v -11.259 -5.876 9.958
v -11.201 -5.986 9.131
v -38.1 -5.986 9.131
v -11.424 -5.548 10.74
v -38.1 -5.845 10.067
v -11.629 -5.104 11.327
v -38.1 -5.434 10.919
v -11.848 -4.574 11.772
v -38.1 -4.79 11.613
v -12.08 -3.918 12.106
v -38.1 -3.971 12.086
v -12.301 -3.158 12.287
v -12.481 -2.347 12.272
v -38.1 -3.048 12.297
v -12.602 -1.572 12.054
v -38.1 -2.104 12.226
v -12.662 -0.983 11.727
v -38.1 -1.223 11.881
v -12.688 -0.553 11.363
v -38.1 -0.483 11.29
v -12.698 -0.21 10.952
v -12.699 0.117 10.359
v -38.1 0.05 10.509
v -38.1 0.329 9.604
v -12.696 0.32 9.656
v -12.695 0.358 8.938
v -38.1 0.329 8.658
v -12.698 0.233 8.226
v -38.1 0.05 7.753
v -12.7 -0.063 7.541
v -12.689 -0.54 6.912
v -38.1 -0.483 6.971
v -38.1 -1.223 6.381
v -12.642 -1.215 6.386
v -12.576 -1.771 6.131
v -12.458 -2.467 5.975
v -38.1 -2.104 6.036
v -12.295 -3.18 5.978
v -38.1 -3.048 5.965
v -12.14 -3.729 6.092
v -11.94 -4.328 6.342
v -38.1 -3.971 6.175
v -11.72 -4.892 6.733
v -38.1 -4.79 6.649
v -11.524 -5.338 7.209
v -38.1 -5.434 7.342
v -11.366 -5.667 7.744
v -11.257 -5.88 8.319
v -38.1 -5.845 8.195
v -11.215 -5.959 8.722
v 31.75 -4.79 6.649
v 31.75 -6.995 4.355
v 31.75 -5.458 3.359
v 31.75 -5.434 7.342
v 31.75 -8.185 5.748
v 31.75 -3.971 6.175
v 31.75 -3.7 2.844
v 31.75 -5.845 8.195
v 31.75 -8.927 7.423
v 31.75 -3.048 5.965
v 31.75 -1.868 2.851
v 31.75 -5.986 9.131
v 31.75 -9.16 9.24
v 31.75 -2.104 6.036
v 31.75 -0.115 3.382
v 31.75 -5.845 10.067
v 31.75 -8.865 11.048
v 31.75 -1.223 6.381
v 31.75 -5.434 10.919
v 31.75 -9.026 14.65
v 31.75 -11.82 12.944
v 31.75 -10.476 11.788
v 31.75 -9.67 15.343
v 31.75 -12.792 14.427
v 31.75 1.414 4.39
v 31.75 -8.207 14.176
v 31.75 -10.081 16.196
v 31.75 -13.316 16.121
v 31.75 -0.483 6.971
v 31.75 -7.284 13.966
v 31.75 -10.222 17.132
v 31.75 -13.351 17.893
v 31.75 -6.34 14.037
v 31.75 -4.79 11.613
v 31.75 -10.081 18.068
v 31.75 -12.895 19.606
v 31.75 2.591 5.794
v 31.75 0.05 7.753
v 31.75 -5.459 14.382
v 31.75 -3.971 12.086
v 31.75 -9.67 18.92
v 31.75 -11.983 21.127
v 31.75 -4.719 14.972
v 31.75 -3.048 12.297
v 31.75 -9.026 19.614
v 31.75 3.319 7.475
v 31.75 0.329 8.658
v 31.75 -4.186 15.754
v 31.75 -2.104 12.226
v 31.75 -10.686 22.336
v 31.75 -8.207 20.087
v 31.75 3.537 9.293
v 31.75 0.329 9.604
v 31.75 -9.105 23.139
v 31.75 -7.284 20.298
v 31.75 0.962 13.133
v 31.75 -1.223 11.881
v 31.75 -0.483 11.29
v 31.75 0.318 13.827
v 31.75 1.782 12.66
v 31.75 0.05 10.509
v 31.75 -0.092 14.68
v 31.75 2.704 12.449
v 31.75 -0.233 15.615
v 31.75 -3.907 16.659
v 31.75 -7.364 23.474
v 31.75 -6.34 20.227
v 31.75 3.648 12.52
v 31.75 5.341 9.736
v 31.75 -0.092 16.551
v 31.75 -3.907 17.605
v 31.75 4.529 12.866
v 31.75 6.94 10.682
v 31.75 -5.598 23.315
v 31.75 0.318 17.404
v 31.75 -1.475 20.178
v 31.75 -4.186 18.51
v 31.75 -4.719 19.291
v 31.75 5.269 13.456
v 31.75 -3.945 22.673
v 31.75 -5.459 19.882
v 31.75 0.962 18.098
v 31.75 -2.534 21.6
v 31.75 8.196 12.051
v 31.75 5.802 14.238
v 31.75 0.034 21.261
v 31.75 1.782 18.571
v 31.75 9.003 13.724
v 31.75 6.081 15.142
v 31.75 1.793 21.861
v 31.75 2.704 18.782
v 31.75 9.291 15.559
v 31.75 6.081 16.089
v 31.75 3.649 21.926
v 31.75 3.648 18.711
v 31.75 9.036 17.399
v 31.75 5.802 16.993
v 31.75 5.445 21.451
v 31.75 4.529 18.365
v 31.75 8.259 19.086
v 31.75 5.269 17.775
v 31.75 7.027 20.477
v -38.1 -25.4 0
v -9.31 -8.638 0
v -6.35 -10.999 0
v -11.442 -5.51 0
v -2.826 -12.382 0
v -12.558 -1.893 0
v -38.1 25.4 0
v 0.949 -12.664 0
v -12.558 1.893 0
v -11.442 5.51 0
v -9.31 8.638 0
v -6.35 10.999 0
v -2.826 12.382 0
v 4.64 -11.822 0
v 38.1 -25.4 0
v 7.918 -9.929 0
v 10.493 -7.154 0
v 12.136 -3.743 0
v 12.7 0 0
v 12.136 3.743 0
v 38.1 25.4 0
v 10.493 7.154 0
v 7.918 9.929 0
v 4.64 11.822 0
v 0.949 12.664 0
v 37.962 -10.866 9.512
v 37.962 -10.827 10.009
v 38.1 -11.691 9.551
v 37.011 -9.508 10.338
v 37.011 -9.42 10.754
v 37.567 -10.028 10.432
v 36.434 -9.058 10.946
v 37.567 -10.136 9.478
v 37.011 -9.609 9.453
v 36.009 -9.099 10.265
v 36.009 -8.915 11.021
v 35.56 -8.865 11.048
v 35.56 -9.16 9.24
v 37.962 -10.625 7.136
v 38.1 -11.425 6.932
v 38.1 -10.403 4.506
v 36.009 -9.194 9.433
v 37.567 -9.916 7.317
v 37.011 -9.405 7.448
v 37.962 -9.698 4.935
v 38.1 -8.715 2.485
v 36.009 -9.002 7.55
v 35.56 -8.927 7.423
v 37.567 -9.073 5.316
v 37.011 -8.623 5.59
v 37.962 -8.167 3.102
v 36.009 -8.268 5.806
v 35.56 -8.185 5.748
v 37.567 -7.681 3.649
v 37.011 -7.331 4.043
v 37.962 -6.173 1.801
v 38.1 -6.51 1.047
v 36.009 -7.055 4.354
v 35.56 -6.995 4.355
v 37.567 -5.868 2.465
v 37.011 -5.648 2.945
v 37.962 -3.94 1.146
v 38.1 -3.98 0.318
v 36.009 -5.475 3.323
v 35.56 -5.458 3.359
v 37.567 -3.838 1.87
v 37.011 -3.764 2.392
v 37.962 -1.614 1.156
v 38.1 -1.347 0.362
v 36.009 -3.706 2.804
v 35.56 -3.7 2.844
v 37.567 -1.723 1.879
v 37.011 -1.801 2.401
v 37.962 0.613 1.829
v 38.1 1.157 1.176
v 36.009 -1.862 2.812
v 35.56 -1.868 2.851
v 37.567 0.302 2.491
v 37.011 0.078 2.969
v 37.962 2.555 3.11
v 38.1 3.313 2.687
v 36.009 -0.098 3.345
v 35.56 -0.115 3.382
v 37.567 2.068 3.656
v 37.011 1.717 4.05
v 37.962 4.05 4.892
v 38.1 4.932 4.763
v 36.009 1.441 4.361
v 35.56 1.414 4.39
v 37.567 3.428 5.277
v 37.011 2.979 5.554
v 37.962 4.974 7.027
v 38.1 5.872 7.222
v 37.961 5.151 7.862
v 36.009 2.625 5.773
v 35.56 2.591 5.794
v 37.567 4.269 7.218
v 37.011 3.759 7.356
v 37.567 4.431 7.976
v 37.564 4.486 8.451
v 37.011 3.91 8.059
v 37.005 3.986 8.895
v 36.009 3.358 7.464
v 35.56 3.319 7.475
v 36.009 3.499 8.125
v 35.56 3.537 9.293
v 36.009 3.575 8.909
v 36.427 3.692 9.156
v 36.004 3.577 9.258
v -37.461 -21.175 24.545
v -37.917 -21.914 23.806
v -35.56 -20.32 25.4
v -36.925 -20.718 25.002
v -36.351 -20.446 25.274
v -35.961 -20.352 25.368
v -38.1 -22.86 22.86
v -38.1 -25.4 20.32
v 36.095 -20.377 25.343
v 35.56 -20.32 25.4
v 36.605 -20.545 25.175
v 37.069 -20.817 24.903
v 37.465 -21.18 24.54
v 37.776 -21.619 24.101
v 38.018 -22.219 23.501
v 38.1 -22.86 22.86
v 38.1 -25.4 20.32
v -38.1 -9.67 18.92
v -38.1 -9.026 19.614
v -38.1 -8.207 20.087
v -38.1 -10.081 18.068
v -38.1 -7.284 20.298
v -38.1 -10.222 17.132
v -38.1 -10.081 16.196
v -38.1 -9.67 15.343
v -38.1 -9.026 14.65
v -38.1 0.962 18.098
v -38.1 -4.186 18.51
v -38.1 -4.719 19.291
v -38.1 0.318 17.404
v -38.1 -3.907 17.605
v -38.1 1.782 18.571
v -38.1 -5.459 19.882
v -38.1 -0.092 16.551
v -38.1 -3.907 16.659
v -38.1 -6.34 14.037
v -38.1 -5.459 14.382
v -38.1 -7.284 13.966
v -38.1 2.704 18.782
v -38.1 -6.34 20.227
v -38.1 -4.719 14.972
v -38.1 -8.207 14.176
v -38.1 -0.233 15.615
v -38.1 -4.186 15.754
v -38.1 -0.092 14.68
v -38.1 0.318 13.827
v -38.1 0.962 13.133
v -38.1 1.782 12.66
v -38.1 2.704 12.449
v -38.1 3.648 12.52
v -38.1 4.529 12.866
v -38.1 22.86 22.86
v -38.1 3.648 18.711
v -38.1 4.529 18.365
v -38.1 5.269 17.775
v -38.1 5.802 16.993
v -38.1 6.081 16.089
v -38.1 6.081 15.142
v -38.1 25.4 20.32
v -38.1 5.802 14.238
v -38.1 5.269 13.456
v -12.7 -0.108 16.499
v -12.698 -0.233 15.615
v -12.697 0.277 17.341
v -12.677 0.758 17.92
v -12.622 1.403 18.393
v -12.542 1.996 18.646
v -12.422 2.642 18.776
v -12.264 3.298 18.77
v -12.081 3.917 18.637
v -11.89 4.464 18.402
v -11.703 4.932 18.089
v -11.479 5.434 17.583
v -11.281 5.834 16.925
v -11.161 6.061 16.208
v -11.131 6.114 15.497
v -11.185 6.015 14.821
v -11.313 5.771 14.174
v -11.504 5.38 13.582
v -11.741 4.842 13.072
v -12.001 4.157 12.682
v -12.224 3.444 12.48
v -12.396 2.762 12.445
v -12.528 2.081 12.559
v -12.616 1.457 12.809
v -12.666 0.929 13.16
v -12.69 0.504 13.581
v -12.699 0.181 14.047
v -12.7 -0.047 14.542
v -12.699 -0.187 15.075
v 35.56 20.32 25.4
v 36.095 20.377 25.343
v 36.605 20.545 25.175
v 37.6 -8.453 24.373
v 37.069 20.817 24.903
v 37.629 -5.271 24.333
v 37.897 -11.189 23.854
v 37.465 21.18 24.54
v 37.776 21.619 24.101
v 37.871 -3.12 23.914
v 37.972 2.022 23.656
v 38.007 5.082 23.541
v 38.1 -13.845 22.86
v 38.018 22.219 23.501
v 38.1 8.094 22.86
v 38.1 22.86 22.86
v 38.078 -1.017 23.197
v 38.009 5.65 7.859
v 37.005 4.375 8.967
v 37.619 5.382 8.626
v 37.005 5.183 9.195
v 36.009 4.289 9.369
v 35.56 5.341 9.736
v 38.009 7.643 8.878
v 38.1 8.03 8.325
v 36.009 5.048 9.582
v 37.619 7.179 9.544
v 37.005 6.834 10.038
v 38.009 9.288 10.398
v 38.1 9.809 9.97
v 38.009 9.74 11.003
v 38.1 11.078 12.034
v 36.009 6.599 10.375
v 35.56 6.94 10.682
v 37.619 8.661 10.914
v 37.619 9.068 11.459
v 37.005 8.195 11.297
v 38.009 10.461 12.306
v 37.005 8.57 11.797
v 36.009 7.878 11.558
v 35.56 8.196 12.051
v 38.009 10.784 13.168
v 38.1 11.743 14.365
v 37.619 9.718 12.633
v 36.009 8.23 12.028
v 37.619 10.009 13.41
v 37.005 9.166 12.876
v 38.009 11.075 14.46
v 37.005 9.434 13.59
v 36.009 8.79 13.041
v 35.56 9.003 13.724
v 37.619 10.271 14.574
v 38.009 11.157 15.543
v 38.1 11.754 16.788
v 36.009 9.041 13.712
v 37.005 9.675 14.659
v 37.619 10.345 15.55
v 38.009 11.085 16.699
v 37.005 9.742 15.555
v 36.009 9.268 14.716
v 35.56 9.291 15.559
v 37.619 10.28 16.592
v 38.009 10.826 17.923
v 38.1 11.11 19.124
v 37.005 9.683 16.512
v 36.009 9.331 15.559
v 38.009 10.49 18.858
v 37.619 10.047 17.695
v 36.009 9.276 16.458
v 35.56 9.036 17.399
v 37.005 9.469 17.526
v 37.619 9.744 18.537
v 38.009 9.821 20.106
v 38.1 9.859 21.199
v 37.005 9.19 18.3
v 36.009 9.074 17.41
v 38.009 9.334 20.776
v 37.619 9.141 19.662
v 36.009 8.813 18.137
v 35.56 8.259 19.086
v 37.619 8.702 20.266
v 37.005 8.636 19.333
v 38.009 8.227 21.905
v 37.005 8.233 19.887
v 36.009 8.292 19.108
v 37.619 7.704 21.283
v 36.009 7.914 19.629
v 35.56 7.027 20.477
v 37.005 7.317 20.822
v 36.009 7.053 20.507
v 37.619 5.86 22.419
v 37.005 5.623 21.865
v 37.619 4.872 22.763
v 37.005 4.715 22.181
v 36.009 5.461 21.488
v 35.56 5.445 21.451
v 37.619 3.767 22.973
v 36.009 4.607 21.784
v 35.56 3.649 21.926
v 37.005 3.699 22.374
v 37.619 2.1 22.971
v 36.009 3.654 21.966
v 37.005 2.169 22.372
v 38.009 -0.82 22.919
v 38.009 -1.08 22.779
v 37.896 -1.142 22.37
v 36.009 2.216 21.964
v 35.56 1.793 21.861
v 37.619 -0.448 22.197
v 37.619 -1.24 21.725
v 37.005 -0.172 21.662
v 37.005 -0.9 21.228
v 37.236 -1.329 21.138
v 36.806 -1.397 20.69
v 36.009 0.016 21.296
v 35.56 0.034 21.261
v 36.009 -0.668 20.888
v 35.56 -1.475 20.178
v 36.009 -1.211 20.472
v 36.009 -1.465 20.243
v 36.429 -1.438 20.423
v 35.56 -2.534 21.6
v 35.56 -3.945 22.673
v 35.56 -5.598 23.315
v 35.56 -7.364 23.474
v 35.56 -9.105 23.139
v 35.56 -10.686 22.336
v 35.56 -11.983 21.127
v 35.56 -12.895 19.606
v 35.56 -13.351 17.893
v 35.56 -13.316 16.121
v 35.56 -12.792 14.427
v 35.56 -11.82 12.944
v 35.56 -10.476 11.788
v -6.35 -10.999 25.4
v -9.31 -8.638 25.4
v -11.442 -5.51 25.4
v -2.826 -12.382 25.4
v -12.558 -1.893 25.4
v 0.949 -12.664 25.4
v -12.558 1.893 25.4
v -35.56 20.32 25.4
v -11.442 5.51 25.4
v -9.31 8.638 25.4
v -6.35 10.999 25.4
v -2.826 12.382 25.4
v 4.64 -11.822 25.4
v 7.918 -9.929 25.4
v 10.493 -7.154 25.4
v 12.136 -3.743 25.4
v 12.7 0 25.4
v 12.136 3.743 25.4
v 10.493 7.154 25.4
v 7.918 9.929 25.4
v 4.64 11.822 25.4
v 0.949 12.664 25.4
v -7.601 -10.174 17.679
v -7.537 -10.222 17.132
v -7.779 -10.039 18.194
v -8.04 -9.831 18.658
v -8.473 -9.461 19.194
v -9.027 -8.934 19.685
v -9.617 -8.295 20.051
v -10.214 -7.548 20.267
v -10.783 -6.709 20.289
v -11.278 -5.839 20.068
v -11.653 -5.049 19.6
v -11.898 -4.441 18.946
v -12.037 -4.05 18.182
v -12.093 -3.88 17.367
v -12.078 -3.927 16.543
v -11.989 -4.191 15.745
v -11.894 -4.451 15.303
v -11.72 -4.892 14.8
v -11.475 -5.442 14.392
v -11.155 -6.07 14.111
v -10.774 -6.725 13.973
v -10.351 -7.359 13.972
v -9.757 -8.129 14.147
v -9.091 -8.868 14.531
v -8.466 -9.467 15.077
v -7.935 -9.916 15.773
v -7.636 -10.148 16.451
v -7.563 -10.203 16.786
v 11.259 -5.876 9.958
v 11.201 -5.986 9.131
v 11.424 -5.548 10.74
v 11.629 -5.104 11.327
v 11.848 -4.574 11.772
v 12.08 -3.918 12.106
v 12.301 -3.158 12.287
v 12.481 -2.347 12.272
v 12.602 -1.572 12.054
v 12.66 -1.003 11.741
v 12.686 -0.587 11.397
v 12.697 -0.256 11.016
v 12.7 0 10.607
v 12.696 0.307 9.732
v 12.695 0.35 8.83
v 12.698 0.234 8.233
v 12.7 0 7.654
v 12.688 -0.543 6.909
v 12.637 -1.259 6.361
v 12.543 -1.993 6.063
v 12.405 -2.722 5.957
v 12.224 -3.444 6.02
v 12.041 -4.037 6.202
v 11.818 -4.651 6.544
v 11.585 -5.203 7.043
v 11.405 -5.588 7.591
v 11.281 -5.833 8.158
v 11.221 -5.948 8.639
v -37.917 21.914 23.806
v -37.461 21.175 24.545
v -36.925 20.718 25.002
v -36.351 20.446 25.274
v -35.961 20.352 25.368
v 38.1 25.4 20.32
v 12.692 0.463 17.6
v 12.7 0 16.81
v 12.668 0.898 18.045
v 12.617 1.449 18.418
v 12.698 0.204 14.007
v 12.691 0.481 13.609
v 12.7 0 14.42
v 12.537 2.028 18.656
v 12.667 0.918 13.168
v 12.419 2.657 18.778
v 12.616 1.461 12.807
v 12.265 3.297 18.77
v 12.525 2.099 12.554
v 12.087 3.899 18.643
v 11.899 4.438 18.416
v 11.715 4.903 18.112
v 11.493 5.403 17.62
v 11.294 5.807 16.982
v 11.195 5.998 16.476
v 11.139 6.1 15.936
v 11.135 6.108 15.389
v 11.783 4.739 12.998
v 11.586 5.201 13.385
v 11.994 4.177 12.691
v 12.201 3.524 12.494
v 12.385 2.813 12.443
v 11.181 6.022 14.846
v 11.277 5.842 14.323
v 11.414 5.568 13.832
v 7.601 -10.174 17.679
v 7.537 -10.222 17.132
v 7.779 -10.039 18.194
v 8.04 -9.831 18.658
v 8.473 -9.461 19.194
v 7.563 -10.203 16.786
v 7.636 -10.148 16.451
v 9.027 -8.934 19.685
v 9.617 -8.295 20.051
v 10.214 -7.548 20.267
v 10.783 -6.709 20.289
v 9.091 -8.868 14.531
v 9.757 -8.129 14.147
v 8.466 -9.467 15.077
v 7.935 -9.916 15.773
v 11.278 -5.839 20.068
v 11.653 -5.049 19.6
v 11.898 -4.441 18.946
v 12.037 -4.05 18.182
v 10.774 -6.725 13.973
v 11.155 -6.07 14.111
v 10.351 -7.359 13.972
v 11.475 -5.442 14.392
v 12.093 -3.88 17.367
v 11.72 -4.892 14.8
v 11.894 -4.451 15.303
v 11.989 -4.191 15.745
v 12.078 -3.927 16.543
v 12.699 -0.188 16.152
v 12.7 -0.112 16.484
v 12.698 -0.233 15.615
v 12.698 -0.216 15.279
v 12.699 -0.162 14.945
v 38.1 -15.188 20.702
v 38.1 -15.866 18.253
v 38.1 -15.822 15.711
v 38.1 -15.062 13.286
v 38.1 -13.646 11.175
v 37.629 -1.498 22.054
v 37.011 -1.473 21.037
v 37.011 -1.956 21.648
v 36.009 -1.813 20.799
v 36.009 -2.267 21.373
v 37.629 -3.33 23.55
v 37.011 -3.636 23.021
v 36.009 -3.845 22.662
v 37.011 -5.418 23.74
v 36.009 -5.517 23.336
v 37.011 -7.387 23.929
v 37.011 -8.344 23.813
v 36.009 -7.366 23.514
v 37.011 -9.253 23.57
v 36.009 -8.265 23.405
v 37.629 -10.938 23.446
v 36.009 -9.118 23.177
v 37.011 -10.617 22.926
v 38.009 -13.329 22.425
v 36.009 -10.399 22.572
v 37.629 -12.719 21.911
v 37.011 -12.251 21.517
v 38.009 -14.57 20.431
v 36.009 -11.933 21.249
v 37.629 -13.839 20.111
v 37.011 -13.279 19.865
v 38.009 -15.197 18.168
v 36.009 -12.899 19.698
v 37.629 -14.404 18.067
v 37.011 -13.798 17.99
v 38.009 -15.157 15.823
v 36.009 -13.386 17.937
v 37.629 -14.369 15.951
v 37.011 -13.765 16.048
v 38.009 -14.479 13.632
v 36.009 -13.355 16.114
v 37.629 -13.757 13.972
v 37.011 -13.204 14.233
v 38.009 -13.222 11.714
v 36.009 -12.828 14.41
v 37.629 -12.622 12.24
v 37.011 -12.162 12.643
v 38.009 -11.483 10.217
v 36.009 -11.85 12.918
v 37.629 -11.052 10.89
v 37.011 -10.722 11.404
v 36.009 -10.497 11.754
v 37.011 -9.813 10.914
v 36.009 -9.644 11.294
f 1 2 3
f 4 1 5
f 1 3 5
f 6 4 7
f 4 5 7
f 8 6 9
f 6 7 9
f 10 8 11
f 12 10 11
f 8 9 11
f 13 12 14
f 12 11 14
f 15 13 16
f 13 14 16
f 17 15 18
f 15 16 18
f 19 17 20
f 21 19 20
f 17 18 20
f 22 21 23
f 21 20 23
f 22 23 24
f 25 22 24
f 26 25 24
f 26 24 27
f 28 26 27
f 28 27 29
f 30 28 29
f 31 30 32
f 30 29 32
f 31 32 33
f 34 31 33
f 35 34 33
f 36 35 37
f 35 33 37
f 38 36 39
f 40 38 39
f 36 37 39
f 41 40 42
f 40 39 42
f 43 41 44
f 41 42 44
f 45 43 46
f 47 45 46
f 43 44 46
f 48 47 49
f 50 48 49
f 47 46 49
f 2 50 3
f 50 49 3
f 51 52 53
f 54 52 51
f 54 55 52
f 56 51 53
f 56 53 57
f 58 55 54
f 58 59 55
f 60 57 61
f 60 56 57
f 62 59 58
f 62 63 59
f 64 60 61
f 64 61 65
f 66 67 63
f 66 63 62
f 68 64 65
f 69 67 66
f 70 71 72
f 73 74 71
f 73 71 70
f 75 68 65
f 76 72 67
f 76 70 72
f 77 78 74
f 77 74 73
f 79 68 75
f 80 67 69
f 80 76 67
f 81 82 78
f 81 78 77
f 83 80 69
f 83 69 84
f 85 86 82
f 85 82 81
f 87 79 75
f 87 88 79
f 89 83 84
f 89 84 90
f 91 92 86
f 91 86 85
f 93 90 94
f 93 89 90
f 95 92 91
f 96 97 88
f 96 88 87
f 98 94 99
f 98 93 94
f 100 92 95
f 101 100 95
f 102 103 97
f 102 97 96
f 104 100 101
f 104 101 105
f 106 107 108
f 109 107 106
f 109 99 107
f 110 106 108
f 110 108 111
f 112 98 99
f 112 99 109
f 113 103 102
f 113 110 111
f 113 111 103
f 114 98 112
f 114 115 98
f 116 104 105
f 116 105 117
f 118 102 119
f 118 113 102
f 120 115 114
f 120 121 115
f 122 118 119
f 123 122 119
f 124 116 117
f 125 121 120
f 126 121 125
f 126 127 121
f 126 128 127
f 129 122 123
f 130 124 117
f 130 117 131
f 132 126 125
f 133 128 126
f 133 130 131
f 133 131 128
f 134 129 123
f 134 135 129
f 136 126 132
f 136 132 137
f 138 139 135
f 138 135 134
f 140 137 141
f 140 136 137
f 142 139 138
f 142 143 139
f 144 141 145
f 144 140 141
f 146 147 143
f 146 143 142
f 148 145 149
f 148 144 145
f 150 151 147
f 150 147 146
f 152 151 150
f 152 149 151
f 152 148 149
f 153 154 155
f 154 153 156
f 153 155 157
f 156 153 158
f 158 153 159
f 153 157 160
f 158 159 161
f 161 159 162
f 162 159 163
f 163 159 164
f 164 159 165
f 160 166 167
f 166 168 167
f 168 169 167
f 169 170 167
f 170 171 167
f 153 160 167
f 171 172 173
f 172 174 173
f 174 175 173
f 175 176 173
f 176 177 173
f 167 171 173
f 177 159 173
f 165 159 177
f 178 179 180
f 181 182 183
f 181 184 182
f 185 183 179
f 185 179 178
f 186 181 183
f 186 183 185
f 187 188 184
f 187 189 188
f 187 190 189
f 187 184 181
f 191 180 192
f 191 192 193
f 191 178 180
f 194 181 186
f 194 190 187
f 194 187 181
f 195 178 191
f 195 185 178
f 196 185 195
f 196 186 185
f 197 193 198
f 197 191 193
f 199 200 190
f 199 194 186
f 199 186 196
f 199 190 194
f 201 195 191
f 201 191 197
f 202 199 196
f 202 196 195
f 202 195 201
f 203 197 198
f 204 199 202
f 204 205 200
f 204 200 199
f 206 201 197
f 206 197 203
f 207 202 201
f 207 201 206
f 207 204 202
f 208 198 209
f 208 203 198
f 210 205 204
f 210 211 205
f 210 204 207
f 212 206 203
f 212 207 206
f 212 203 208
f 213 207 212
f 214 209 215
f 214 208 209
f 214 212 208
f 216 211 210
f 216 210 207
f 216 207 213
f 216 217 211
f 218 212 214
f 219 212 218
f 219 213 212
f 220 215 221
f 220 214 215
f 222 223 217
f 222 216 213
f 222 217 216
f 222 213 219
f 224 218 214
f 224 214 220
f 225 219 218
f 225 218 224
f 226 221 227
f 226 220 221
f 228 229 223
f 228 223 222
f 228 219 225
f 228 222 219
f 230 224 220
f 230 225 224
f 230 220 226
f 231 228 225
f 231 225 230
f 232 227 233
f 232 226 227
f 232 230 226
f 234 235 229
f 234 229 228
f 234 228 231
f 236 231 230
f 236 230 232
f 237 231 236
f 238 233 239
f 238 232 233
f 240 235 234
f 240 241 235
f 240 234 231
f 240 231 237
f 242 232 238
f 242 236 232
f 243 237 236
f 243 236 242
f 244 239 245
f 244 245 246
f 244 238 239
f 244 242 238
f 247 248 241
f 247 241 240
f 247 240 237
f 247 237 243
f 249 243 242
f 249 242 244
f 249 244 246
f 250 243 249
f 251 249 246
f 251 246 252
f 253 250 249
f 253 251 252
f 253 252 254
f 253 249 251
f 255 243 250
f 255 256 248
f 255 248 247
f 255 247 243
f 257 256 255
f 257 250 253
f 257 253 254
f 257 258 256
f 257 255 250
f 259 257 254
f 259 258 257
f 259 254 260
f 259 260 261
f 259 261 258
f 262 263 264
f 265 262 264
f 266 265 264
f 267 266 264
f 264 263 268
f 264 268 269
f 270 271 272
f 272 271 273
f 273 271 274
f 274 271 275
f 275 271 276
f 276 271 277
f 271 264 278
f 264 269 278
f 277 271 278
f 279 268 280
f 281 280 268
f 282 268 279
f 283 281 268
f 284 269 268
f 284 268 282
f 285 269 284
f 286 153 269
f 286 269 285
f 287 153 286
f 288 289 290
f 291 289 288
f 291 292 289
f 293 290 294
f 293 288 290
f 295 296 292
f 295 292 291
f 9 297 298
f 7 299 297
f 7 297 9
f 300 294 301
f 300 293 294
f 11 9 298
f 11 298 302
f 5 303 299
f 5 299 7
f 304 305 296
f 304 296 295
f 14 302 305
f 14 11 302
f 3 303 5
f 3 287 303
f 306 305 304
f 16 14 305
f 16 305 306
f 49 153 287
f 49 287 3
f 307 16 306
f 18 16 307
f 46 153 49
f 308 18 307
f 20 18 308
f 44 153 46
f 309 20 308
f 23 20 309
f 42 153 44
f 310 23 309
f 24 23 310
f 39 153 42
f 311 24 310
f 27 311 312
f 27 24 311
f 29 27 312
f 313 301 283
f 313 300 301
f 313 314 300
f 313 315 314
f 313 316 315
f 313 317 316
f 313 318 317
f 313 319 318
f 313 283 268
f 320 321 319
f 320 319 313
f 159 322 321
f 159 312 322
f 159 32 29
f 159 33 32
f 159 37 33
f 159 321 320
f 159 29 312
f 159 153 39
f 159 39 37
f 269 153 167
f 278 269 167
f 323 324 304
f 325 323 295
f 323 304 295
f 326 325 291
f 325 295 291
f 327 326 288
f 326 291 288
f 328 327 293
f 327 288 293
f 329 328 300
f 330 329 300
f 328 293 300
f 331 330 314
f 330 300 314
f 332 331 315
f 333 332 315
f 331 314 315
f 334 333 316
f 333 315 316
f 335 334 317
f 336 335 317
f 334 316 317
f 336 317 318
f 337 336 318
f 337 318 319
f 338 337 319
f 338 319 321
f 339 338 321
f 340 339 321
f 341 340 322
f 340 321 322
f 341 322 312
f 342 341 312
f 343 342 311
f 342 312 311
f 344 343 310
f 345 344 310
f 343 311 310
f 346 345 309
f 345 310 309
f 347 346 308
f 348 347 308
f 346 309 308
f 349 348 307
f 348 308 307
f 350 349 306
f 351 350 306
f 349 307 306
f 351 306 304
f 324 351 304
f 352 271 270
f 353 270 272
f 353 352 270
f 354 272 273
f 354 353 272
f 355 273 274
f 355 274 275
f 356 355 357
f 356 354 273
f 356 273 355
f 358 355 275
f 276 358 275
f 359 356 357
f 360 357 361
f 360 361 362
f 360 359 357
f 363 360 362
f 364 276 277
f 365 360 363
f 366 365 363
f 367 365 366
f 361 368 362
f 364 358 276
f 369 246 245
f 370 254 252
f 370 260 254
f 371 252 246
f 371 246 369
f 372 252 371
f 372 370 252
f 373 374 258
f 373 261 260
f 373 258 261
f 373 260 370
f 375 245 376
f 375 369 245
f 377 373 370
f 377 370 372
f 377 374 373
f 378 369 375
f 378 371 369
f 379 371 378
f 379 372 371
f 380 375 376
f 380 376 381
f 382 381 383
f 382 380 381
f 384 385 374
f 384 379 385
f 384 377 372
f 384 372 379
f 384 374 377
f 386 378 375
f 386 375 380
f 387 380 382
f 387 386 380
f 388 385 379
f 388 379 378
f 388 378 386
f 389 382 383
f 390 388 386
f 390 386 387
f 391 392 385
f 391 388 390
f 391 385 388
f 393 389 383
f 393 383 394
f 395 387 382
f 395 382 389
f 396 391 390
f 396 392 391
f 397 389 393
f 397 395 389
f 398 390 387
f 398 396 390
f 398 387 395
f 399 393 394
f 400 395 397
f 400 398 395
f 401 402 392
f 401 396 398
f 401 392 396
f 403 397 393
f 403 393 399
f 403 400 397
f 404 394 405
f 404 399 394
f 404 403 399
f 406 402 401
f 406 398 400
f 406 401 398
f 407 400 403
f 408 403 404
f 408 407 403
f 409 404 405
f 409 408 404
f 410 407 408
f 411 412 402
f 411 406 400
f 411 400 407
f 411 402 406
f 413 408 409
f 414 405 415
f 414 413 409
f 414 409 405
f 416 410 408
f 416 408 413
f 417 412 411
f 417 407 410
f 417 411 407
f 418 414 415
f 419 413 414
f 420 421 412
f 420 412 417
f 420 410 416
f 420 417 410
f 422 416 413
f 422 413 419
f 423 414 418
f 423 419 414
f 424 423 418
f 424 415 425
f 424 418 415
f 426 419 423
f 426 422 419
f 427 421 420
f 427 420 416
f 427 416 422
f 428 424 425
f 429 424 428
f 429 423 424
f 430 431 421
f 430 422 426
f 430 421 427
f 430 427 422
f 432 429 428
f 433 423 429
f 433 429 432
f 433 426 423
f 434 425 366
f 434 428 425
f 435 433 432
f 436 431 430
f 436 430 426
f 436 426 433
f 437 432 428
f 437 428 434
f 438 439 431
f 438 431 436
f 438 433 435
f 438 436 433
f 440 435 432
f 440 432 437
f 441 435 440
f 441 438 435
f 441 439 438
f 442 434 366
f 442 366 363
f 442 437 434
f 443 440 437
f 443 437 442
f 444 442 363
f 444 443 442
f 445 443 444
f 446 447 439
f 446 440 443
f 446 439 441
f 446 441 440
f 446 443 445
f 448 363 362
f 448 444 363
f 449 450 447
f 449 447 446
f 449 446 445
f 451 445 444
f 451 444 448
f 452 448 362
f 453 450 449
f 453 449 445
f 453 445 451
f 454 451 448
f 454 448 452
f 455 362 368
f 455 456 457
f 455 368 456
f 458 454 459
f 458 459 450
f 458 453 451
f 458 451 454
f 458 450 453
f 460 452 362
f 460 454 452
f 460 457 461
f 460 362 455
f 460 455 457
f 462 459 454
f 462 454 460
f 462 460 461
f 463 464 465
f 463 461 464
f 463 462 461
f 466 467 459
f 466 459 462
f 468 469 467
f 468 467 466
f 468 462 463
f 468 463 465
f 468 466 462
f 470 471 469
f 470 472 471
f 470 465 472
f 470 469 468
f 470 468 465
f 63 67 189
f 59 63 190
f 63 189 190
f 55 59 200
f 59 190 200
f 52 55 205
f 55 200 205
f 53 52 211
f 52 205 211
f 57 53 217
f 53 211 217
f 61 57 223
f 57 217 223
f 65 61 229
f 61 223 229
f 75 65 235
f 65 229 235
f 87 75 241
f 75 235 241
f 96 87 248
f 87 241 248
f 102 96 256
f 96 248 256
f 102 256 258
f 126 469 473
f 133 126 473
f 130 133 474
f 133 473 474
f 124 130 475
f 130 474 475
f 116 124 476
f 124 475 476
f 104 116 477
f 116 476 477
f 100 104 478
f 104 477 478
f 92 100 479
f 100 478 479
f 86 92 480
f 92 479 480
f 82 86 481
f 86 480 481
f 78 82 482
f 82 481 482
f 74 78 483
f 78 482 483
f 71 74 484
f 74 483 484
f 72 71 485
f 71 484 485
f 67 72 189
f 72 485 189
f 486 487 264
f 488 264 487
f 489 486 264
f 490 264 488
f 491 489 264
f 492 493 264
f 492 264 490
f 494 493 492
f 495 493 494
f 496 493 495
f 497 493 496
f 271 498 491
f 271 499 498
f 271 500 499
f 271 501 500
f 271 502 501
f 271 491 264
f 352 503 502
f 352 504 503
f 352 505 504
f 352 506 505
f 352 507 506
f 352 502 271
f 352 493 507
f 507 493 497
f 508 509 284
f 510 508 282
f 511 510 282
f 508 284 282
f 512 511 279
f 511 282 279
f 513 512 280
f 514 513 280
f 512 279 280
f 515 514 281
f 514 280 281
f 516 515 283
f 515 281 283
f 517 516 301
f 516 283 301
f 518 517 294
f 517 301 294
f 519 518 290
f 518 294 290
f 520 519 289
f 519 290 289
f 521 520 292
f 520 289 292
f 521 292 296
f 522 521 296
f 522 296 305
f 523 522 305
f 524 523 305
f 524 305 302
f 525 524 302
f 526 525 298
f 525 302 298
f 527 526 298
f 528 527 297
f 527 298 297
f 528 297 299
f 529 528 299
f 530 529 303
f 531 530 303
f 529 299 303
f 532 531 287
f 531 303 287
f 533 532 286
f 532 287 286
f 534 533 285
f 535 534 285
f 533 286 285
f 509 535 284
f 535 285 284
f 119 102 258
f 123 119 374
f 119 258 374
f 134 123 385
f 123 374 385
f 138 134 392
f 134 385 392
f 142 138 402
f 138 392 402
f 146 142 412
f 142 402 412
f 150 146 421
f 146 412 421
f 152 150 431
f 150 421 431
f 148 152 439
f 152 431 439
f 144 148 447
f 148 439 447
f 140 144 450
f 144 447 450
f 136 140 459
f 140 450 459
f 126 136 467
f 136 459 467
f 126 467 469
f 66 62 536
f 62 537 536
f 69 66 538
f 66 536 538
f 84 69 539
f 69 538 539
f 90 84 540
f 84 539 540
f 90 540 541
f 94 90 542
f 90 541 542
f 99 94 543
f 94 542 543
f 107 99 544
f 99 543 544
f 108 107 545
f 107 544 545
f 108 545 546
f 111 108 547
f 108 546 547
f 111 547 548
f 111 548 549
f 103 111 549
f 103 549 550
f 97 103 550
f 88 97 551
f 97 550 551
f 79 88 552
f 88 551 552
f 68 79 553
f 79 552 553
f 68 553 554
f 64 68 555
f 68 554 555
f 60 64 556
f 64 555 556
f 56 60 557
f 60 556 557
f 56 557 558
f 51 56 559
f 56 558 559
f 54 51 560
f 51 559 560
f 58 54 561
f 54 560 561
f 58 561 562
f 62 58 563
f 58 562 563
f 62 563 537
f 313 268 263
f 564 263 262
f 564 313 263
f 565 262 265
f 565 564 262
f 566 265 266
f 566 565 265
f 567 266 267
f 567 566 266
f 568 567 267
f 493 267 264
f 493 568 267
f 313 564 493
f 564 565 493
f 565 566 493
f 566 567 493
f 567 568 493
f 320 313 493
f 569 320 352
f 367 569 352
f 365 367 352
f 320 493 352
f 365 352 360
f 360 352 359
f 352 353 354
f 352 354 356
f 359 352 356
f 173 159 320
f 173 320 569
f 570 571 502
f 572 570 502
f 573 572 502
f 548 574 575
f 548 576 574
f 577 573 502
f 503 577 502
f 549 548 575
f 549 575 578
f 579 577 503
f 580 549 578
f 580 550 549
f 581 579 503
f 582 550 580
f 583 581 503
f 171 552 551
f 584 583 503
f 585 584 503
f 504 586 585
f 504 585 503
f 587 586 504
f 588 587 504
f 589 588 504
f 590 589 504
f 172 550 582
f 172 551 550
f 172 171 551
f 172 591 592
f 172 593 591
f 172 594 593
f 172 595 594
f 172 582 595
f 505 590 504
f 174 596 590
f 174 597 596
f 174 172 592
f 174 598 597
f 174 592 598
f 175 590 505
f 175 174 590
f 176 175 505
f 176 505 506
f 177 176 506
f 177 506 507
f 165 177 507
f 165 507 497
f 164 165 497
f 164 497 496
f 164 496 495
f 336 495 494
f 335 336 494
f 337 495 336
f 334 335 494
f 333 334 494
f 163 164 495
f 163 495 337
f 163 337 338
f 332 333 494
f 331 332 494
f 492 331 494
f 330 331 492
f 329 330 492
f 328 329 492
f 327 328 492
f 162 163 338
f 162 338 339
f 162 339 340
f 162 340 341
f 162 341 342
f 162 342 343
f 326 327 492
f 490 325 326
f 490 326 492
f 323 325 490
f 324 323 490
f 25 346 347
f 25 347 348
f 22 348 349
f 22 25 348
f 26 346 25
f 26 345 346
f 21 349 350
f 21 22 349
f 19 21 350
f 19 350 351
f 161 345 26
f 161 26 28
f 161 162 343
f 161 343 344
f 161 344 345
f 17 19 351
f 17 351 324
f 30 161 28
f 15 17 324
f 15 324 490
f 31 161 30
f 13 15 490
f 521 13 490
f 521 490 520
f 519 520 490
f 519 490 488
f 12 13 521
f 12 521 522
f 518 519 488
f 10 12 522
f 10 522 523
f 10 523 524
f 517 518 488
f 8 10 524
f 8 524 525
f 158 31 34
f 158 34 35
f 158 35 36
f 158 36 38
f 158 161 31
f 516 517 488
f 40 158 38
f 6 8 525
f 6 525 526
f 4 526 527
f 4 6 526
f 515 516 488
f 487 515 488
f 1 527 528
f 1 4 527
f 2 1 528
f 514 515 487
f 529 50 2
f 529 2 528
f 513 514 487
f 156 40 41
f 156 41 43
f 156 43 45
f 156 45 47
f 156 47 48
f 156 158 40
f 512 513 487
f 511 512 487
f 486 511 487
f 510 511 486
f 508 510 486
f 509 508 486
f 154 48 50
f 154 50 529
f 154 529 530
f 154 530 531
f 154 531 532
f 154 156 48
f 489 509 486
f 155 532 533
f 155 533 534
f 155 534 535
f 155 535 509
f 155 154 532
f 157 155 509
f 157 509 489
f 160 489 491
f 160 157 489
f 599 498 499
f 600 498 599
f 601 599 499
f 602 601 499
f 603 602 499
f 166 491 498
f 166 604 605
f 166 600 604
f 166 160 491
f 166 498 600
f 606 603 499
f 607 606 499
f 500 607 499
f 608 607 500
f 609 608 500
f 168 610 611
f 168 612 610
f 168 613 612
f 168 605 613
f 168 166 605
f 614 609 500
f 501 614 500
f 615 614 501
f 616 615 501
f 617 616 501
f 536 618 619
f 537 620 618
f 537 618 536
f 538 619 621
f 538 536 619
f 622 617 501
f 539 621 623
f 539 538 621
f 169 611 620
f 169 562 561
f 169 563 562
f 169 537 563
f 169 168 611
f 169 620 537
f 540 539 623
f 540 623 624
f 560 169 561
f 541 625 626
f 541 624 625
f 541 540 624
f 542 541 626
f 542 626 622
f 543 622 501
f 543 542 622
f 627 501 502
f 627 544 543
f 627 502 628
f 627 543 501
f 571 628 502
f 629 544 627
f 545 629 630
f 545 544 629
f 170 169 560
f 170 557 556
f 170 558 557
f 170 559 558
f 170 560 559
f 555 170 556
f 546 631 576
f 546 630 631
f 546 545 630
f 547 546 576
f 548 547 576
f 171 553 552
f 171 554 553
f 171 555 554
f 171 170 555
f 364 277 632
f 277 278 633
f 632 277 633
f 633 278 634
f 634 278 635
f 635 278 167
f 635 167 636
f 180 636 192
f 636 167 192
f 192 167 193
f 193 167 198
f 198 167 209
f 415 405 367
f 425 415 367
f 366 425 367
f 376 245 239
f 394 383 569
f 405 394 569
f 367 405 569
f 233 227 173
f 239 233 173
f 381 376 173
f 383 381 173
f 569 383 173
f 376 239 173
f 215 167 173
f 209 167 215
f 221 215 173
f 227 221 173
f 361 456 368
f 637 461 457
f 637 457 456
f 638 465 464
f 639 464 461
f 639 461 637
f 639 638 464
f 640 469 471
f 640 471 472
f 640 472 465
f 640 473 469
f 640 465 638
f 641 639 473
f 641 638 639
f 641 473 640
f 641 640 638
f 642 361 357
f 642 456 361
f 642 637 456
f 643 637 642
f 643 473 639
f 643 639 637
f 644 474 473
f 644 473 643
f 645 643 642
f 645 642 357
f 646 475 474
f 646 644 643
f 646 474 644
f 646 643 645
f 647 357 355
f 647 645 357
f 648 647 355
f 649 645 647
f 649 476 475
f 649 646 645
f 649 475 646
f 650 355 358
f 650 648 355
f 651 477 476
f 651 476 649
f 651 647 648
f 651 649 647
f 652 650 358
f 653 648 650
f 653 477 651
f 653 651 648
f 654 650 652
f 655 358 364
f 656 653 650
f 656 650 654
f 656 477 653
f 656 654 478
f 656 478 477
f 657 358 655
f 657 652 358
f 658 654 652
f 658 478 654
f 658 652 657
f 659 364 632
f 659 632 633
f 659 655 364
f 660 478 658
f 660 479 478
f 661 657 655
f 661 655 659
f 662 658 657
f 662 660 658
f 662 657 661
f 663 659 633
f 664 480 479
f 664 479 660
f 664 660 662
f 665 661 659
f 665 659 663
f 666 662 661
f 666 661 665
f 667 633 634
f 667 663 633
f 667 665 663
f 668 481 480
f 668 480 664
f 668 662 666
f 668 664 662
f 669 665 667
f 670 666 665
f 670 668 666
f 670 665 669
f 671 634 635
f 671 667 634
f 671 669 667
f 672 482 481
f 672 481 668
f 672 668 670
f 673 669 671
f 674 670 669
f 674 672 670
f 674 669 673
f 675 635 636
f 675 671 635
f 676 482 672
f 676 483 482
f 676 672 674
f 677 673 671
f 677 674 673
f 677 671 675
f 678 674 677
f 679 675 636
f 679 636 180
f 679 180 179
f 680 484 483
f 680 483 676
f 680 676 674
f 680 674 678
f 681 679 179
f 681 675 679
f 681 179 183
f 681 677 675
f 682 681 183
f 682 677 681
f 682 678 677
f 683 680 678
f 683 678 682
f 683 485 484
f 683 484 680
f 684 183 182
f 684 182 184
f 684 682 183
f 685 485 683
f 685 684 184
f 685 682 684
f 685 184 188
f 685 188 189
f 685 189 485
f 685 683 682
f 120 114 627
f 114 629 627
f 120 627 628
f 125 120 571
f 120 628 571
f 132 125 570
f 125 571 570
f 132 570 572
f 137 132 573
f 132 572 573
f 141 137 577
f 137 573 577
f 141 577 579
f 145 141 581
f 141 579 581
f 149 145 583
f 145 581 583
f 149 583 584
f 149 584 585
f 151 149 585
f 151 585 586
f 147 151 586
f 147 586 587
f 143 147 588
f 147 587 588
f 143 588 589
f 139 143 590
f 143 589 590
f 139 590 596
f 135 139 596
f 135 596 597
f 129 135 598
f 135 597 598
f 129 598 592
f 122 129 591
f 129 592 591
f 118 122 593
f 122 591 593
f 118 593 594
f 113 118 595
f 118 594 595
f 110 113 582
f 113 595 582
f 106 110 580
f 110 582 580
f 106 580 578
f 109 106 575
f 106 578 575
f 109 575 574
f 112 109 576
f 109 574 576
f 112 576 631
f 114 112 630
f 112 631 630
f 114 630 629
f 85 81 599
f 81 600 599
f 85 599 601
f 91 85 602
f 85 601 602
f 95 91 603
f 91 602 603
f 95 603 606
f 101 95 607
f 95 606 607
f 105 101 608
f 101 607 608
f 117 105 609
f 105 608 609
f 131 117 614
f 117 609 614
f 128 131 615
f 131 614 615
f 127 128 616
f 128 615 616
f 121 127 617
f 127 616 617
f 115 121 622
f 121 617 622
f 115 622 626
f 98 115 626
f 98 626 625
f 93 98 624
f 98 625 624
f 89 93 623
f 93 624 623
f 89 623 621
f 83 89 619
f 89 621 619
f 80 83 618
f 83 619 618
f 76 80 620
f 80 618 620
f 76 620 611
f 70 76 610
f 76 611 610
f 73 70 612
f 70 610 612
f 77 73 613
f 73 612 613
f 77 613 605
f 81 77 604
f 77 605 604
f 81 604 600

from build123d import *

# Parameters (mm, degrees)
F0_W           = 76.2
F0_H           = 50.8
F0_R           = 12.7
F1_DEPTH       = 25.4
F3_D           = 6.35
F3_CBORE_D     = 12.7
F3_CBORE_DEPTH = 6.35
F4_SIZE        = 5.08
F5_R           = 2.54
F6_T1_DEPTH    = 53.34
F6_T4_ANGLE    = 333.5496050311
F6_T6_ANGLE    = 313.8522207809
F6_T8_ANGLE    = 339.5771348814


# Not quite as in the source:
# - a fillet or chamfer that OpenCascade refuses, or shapes differently, is made with other operations: its cross-section is extruded or revolved along the edge and cut away or added


with BuildPart() as f1:
    # F0 (on Top) → F1 (new body)
    with BuildSketch(Plane.XY):
        Rectangle(F0_W, F0_H)
        Circle(F0_R, mode=Mode.SUBTRACT)
    extrude(amount=F1_DEPTH)

    # F3 (through all)
    with Locations(Plane.YZ.offset(38.1)):
        with Locations((-7.0466324687, 17.1319264919), (2.941543702, 15.6153971329), (-2.8108085971, 9.1309268028)):
            CounterBoreHole(F3_D / 2, F3_CBORE_D / 2, F3_CBORE_DEPTH)

    # F4
    f4_edges = [f1.edges().sort_by_distance(p)[0] for p in [
        (0, -25.4, 25.4),
        (0, 25.4, 25.4),
    ]]
    chamfer(f4_edges, length=F4_SIZE)

    # F5
    f5_edges = [f1.edges().sort_by_distance(p)[0] for p in [
        (-38.1, 0, 25.4),
    ]]
    fillet(f5_edges, radius=F5_R)

    # F6: fillet of radius 2.54 on 4 edges, made by hand

    # F6_s2 → F6_t1 (cut)
    with BuildSketch(Plane.XZ.offset(-26.67)):
        with BuildLine():
            ThreePointArc((35.56, 25.4), (37.3560512242, 24.6560512242), (38.1, 22.86))
            Line((38.1, 22.86), (38.1, 25.4))
            Line((38.1, 25.4), (35.56, 25.4))
        make_face()
    extrude(amount=F6_T1_DEPTH, mode=Mode.SUBTRACT)

    # F6_s3 → F6_t4 (revolve, cut)
    with BuildSketch(Plane(origin=(0, -6.4599960512, 8.2833530872), x_dir=(1, 0, 0), z_dir=(0, -0.6149714639, 0.7885493634))):
        with BuildLine():
            ThreePointArc((38.1, 3.032576048), (37.3560512242, 4.8286272723), (35.56, 5.572576048))
            Line((35.56, 5.572576048), (38.1, 5.572576048))
            Line((38.1, 5.572576048), (38.1, 3.032576048))
        make_face()
    revolve(axis=Axis((38.1, 2.941543702, 15.6153971329), (1, 0, 0)), revolution_arc=F6_T4_ANGLE, mode=Mode.SUBTRACT)

    # F6_s5 → F6_t6 (revolve, cut)
    with BuildSketch(Plane(origin=(0, -0.3361656341, -0.0902154954), x_dir=(1, 0, 0), z_dir=(0, 0.9658250629, 0.2591948067))):
        with BuildLine():
            ThreePointArc((38.1, -18.4374249449), (37.3560512242, -16.6413737207), (35.56, -15.8974249449))
            Line((35.56, -15.8974249449), (38.1, -15.8974249449))
            Line((38.1, -15.8974249449), (38.1, -18.4374249449))
        make_face()
    revolve(axis=Axis((38.1, -2.8108085971, 9.1309268028), (1, 0, 0)), revolution_arc=F6_T6_ANGLE, mode=Mode.SUBTRACT)

    # F6_s7 → F6_t8 (revolve, cut)
    with BuildSketch(Plane(origin=(0, 5.5955772378, 10.1893133195), x_dir=(1, 0, 0), z_dir=(0, -0.4813542865, -0.8765261267))):
        with BuildLine():
            ThreePointArc((38.1, 5.5330837175), (37.3560512242, 7.3291349418), (35.56, 8.0730837175))
            Line((35.56, 8.0730837175), (38.1, 8.0730837175))
            Line((38.1, 8.0730837175), (38.1, 5.5330837175))
        make_face()
    revolve(axis=Axis((38.1, -7.0466324687, 17.1319264919), (1, 0, 0)), revolution_arc=F6_T8_ANGLE, mode=Mode.SUBTRACT)


solid = f1.part
